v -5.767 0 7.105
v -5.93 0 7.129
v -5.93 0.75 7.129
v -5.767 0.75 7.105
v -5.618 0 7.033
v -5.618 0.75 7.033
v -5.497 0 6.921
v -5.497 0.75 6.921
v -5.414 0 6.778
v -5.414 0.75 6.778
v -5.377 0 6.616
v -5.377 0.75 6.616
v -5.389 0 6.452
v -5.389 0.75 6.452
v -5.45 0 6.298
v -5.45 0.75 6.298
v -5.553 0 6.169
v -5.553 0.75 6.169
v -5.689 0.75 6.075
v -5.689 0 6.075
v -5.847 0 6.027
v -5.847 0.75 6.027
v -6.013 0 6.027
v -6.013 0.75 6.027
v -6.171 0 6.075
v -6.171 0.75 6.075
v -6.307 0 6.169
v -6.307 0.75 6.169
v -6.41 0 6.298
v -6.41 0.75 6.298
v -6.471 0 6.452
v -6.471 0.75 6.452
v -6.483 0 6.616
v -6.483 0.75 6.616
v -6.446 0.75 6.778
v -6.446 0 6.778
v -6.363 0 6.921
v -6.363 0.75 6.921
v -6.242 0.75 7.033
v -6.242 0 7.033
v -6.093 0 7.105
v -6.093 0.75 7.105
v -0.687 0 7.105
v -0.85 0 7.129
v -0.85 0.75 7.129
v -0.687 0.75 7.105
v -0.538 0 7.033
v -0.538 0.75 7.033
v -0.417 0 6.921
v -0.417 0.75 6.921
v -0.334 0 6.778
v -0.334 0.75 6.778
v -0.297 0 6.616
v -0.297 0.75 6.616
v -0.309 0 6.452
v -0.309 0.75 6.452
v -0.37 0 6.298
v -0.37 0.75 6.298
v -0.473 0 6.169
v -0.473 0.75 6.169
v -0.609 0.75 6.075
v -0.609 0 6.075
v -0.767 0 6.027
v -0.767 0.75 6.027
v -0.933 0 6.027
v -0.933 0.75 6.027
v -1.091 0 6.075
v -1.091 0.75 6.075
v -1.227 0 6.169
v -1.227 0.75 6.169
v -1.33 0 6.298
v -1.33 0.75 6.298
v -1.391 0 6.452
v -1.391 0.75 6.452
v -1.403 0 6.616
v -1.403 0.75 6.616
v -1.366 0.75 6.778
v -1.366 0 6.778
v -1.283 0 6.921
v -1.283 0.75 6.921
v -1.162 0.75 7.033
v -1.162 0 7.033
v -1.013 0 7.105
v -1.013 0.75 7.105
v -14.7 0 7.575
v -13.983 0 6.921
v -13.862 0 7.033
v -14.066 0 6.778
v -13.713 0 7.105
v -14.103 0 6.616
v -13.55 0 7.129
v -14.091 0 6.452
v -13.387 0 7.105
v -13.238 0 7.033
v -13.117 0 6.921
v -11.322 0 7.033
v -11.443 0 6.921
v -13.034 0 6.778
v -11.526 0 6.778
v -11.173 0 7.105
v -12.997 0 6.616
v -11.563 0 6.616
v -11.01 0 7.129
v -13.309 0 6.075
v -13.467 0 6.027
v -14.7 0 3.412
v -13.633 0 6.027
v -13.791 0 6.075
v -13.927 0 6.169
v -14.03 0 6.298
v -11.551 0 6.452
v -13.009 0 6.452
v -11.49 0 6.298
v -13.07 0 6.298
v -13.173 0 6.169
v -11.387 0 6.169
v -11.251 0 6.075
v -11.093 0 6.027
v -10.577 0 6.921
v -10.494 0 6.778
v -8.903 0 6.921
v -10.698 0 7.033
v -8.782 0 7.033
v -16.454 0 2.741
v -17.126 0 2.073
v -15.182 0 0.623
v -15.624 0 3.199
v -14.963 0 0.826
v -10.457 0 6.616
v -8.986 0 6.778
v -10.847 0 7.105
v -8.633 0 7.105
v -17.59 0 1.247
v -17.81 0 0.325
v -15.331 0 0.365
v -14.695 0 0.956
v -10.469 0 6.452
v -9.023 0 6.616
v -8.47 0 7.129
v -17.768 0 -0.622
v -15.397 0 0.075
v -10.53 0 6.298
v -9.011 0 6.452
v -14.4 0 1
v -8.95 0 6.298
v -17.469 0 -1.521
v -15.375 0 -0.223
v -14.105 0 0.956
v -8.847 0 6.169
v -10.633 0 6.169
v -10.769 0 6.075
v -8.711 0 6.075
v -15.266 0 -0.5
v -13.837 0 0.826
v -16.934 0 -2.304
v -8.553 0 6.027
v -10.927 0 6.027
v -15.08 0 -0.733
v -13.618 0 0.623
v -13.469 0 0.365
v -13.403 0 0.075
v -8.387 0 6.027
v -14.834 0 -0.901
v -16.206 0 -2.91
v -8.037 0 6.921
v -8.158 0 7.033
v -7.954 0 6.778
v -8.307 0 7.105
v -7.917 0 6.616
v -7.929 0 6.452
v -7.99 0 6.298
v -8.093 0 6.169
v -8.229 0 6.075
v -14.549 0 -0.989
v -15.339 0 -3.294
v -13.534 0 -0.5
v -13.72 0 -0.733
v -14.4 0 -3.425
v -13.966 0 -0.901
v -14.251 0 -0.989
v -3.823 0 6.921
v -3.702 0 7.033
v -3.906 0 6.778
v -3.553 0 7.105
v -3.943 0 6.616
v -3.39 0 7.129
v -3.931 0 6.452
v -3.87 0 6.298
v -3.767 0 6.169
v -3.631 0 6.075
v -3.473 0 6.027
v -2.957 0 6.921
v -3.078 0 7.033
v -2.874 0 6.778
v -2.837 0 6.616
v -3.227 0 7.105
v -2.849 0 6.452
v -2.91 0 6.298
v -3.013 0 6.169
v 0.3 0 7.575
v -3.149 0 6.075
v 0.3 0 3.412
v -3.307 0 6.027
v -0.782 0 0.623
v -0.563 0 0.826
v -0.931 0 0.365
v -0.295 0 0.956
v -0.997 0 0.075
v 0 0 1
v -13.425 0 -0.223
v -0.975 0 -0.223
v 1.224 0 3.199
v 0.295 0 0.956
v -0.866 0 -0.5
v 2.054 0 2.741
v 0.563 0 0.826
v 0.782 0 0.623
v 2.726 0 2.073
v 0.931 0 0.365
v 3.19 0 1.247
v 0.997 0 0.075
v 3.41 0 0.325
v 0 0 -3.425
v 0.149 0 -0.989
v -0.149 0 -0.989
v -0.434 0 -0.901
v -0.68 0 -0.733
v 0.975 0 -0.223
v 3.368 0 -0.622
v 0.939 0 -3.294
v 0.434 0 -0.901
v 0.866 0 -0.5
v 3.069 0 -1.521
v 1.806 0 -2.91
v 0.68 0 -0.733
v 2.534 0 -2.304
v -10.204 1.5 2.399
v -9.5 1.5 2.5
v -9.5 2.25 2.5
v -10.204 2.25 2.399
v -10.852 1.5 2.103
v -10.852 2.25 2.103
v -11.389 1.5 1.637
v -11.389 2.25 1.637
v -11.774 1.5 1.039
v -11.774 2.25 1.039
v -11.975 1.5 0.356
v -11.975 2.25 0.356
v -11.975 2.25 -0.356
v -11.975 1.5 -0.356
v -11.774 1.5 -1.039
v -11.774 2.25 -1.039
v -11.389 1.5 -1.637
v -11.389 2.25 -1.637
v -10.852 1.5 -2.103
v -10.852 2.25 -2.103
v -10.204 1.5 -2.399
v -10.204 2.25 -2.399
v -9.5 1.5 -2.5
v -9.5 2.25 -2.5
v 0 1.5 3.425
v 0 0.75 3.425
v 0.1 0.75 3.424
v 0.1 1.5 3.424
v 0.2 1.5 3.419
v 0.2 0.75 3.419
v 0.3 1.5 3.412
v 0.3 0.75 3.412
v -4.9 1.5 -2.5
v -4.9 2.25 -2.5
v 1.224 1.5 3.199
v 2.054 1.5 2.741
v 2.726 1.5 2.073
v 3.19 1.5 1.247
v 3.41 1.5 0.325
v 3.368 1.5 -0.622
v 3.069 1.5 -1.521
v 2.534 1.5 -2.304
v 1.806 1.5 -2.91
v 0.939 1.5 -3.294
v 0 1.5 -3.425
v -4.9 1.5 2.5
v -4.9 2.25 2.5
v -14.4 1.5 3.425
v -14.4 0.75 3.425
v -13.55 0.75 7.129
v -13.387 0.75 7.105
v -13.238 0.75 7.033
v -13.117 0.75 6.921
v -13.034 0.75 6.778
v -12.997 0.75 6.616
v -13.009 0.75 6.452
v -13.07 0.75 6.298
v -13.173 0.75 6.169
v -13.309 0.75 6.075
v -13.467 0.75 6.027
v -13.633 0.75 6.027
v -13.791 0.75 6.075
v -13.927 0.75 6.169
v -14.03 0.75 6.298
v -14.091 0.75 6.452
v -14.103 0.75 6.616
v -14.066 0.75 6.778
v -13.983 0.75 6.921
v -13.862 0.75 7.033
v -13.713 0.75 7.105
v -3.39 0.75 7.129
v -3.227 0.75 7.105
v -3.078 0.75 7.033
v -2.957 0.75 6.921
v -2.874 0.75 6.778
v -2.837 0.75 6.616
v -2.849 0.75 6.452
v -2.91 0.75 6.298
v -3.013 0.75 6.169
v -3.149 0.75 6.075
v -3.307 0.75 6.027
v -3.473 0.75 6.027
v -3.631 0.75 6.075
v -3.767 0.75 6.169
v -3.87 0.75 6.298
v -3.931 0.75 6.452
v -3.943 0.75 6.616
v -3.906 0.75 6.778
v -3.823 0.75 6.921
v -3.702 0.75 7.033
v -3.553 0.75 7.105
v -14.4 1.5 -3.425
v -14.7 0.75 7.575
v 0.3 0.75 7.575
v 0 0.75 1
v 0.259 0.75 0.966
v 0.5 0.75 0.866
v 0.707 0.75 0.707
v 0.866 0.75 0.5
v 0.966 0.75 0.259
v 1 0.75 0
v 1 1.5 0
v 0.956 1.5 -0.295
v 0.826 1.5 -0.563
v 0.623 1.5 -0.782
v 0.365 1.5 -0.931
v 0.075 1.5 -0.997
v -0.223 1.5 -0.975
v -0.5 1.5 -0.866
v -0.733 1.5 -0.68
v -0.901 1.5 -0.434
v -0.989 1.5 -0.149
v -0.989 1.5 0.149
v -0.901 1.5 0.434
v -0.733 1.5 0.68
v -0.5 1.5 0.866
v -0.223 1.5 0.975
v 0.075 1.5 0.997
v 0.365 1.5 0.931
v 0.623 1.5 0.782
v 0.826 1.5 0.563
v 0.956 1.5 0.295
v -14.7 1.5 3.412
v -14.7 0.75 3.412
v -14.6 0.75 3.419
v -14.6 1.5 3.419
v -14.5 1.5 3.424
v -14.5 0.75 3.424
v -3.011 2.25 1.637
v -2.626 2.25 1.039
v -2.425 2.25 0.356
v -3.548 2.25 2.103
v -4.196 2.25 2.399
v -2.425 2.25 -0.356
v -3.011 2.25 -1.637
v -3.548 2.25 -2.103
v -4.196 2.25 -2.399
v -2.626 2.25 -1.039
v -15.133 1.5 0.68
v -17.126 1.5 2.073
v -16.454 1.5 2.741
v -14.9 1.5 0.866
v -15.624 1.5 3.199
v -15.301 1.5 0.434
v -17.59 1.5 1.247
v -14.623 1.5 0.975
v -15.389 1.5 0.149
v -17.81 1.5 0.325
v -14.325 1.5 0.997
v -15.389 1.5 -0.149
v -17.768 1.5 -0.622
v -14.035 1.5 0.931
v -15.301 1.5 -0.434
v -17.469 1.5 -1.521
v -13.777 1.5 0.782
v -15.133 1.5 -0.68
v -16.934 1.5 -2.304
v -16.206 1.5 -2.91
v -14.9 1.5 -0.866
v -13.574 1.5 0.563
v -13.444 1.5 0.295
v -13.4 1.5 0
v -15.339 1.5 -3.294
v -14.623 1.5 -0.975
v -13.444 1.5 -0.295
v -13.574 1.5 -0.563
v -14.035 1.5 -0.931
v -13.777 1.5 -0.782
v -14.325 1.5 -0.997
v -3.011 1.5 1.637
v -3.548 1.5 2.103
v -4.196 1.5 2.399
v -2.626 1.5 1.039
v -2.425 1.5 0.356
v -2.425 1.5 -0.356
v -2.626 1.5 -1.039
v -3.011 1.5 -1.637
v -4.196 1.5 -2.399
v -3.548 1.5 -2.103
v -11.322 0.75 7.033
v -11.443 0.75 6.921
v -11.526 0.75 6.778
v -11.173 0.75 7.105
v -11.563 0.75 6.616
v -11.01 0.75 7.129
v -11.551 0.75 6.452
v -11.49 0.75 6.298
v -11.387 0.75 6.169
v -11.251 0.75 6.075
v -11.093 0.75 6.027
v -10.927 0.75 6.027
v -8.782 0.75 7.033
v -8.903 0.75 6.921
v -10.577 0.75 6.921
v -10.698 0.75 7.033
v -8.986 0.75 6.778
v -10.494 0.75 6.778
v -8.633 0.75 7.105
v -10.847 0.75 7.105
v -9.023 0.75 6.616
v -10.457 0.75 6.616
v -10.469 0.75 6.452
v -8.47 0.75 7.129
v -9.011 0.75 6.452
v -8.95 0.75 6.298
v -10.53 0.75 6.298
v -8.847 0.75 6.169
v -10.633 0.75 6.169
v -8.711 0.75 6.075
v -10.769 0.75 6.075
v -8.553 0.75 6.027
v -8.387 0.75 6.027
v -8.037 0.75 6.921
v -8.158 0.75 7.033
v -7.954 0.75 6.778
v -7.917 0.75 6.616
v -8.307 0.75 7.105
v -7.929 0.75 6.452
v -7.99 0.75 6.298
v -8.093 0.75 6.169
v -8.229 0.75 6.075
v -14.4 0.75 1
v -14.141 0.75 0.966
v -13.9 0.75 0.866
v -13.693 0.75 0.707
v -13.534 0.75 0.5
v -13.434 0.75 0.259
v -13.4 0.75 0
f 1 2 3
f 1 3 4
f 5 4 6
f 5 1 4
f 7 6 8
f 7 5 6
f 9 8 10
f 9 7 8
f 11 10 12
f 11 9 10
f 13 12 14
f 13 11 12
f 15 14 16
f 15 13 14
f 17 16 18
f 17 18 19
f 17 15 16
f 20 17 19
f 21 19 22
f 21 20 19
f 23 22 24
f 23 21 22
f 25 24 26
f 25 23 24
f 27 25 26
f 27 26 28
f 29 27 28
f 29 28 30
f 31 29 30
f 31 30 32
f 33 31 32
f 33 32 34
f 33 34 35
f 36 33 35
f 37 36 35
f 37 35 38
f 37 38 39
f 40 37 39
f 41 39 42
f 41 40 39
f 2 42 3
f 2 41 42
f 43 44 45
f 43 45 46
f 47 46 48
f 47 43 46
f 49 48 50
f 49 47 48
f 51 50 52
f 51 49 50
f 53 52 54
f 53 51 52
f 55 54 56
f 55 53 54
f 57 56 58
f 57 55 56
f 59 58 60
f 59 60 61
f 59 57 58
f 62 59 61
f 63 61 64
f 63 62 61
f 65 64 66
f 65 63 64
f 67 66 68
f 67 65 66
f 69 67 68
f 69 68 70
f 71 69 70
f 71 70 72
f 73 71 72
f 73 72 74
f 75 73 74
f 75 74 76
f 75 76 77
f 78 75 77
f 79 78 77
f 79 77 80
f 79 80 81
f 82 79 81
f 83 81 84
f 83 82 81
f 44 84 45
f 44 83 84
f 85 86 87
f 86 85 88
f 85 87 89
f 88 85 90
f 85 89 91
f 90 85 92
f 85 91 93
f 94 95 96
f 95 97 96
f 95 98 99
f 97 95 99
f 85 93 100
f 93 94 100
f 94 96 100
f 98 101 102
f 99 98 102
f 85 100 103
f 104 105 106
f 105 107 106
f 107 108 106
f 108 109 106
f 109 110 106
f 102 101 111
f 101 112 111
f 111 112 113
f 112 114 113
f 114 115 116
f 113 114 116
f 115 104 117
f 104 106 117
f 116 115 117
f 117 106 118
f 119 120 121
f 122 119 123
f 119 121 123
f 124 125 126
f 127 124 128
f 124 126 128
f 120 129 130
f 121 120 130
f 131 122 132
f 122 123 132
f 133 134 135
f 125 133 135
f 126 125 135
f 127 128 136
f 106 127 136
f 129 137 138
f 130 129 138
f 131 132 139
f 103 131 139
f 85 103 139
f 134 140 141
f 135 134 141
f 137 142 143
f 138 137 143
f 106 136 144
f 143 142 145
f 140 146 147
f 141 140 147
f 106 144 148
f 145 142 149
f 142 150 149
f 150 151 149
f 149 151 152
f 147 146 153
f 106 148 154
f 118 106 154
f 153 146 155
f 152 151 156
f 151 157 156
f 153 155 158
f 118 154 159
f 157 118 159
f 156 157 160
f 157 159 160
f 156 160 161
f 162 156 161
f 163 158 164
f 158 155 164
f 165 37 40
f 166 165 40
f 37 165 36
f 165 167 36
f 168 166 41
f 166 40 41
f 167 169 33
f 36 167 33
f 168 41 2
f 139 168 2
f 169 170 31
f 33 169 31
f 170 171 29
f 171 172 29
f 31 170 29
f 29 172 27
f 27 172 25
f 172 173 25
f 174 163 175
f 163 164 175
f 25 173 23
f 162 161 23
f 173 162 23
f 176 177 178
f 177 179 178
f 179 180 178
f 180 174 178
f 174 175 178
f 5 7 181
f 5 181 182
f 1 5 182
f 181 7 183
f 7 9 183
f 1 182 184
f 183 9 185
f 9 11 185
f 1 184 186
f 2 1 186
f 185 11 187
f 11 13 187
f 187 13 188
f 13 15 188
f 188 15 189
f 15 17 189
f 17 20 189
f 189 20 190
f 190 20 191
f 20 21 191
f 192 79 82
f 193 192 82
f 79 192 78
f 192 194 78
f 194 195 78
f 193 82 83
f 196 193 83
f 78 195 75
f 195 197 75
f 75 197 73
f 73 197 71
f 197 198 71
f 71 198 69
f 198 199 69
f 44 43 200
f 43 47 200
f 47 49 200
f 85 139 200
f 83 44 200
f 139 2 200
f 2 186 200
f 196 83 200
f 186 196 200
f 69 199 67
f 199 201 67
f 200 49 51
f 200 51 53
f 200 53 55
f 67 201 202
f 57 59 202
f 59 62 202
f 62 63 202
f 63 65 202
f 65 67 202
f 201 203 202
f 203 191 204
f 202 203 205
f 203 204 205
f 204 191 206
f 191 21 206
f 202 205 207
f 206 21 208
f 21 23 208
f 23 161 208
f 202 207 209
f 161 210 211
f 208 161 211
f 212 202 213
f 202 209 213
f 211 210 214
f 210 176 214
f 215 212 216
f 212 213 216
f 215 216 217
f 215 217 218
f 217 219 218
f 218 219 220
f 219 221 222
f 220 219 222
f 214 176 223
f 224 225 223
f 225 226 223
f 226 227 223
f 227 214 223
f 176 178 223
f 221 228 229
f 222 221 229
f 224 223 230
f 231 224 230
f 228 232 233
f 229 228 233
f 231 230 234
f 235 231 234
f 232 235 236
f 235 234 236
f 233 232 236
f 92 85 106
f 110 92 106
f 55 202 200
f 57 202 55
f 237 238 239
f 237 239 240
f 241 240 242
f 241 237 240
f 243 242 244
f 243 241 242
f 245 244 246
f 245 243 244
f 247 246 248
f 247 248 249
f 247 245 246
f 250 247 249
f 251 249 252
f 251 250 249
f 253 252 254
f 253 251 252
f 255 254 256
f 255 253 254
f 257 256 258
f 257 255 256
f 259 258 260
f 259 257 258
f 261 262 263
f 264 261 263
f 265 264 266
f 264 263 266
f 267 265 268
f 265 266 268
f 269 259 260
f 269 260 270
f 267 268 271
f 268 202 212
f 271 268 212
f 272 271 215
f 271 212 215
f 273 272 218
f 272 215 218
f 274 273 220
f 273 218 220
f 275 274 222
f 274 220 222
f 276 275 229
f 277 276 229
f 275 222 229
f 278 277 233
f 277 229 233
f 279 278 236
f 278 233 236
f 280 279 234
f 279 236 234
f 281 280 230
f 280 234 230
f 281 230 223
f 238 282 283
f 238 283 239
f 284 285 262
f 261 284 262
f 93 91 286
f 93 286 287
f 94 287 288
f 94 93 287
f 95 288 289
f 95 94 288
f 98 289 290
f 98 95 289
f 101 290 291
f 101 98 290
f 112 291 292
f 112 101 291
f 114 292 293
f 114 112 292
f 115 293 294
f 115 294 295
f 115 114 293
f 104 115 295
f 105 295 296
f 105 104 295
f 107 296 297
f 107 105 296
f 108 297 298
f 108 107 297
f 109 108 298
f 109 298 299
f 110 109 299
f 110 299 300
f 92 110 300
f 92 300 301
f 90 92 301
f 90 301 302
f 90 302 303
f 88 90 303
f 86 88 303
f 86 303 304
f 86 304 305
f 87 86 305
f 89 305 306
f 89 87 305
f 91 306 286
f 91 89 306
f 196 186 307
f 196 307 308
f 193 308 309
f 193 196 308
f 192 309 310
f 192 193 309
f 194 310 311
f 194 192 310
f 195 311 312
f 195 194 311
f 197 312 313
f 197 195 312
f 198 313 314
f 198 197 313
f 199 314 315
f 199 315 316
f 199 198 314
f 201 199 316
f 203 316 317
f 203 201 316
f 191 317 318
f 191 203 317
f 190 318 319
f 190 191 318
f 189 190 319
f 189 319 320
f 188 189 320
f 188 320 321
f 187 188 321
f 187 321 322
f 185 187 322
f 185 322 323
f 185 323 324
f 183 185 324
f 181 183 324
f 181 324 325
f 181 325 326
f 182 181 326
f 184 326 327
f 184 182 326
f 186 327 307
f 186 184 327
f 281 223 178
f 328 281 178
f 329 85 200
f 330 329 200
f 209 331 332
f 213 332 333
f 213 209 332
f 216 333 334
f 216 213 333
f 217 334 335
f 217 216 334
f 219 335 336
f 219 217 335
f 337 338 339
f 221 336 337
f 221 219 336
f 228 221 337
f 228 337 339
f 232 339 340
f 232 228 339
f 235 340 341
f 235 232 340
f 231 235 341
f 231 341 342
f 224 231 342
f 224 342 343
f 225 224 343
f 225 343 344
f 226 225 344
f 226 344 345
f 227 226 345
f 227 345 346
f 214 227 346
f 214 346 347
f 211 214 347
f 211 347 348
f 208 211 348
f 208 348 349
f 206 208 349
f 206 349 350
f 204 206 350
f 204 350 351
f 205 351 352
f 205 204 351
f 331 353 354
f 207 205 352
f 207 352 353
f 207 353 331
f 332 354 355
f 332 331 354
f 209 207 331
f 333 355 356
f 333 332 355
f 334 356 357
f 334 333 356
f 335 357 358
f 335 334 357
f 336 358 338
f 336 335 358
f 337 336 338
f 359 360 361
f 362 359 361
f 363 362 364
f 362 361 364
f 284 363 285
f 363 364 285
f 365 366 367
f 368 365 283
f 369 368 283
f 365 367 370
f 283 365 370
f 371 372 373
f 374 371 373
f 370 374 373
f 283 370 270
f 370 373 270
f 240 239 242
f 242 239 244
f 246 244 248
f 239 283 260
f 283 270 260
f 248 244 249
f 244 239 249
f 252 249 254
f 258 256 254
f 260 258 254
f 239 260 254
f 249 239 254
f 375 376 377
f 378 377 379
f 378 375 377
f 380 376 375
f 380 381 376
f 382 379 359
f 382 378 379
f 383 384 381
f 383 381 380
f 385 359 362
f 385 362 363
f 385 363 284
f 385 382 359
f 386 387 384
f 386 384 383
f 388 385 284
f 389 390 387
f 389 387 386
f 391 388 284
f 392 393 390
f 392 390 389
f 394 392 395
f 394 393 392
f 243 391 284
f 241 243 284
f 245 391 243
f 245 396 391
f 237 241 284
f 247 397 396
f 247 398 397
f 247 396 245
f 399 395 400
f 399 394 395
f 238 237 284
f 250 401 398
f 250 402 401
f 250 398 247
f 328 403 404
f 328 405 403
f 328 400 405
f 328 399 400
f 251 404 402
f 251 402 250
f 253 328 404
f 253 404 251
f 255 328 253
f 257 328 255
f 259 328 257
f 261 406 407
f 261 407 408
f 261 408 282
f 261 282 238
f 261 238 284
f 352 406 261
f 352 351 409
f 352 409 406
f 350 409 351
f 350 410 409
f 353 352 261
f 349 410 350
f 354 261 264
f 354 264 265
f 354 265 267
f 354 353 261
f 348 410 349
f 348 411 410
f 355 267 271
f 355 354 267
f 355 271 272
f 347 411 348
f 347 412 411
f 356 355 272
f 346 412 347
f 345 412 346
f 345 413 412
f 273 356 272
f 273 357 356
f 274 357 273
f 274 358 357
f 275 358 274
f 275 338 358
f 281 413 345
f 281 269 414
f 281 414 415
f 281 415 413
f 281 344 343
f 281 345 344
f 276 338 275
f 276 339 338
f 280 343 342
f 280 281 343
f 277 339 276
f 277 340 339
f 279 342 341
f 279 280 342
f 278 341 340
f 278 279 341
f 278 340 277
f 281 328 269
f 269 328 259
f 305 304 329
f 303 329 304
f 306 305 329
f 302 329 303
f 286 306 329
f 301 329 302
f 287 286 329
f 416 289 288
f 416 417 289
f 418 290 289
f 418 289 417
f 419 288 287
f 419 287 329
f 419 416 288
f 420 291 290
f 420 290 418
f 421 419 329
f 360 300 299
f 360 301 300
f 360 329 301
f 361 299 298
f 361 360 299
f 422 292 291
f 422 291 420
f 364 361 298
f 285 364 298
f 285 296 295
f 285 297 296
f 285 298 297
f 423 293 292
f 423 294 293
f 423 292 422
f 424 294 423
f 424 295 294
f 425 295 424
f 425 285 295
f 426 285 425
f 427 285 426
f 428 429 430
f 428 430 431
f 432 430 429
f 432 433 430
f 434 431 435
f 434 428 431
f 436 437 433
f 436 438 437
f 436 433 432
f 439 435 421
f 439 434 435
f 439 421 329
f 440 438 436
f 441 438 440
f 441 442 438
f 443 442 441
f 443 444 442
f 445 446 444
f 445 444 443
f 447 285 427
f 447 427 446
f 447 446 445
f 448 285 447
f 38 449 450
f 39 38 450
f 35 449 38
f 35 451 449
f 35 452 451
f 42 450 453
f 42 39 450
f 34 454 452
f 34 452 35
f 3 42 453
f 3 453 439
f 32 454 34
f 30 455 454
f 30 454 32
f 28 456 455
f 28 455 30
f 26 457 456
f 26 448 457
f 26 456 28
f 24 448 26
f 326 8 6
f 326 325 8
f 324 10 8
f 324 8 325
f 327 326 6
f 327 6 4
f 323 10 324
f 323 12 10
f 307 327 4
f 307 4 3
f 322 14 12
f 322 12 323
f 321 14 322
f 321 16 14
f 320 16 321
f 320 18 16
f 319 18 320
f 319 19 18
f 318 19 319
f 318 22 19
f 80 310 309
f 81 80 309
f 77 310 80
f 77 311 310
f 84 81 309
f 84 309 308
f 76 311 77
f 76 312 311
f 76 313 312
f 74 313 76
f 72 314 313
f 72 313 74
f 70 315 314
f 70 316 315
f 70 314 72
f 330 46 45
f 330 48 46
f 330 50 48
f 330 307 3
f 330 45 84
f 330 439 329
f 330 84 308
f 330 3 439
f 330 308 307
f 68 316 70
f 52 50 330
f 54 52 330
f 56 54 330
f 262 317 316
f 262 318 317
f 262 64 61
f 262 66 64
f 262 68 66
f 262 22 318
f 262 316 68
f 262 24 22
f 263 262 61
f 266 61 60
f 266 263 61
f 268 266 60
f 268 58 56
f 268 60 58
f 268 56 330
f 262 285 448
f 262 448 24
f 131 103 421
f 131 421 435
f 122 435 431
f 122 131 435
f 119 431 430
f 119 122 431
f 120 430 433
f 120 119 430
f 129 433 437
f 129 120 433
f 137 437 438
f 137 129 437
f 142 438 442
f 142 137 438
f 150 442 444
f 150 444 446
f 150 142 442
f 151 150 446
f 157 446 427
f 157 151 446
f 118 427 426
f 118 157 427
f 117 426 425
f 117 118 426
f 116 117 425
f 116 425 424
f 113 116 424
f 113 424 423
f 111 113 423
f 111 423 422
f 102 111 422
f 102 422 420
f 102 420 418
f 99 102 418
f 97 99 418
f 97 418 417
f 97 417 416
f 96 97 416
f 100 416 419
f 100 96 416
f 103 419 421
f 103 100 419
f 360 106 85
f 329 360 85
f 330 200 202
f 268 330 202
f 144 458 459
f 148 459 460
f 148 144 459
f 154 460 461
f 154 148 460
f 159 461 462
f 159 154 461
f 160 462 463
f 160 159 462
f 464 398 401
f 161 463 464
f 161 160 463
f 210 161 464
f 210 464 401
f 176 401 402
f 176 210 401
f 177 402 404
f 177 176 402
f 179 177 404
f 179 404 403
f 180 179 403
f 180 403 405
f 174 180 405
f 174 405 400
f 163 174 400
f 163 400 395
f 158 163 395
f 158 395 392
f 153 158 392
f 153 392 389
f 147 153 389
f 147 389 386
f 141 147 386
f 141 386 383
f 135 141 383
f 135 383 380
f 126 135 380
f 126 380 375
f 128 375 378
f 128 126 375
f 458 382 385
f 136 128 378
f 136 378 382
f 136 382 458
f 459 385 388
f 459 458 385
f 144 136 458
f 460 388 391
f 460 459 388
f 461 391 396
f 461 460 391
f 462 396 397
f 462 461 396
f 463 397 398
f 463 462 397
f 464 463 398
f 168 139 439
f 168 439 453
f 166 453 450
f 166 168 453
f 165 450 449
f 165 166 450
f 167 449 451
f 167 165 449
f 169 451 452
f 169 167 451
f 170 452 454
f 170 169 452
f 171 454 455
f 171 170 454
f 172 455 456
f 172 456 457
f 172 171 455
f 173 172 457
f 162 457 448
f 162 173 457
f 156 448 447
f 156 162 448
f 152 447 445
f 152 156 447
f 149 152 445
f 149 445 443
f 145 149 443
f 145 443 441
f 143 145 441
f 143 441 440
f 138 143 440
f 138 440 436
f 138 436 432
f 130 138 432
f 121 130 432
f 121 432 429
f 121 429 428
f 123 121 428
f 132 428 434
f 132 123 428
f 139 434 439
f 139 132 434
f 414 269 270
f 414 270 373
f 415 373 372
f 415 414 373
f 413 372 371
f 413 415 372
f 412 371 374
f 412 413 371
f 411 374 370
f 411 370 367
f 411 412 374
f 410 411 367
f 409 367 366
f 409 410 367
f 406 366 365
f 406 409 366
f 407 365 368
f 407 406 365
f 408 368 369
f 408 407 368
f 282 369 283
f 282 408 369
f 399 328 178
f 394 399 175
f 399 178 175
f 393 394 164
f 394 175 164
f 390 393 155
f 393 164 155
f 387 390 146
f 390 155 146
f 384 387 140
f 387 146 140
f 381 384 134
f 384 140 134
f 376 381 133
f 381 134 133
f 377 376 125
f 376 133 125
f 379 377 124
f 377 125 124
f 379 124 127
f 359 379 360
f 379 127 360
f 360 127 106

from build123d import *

# Parameters (mm, degrees)
SKETCH_2_R      = 1
SKETCH_2_R_2    = 0.554445532
EXTRUDE_3_DEPTH = 0.75
SKETCH_2_5_R    = 1
EXTRUDE_4_DEPTH = 1.5
EXTRUDE_5_DEPTH = 0.75


with BuildPart() as part:
    # 草图2 → 凸台-拉伸3 (new body)
    with BuildSketch(Plane(origin=(0, 0, 0), x_dir=(1, 0, 0), z_dir=(0, 1, 0))):
        with BuildLine():
            Line((0, 3.425), (-14.4, 3.425))
            ThreePointArc((-14.4, 3.425), (-17.821707421, 0.150144339), (-14.7, -3.411836016))
            Line((-14.7, -3.411836016), (-14.7, -7.575))
            Line((-14.7, -7.575), (0.3, -7.575))
            Line((0.3, -7.575), (0.3, -3.411836016))
            ThreePointArc((0.3, -3.411836016), (3.421707421, 0.150144339), (0, 3.425))
        make_face()
        with Locations((-14.4, 0)):
            Circle(SKETCH_2_R, mode=Mode.SUBTRACT)
        Circle(SKETCH_2_R, mode=Mode.SUBTRACT)
        with Locations((-5.93, -6.575)):
            Circle(SKETCH_2_R_2, mode=Mode.SUBTRACT)
        with Locations((-3.39, -6.575)):
            Circle(SKETCH_2_R_2, mode=Mode.SUBTRACT)
        with Locations((-0.85, -6.575)):
            Circle(SKETCH_2_R_2, mode=Mode.SUBTRACT)
        with Locations((-13.55, -6.575)):
            Circle(SKETCH_2_R_2, mode=Mode.SUBTRACT)
        with Locations((-11.01, -6.575)):
            Circle(SKETCH_2_R_2, mode=Mode.SUBTRACT)
        with Locations((-8.47, -6.575)):
            Circle(SKETCH_2_R_2, mode=Mode.SUBTRACT)
    extrude(amount=EXTRUDE_3_DEPTH)

    # 草图2<5> → 凸台-拉伸4 (add)
    with BuildSketch(Plane(origin=(0, 0, 0), x_dir=(1, 0, 0), z_dir=(0, 1, 0))):
        with BuildLine():
            Line((0, 3.425), (-14.4, 3.425))
            ThreePointArc((-14.4, 3.425), (-17.821707421, 0.150144339), (-14.7, -3.411836016))
            ThreePointArc((-14.7, -3.411836016), (-14.550144339, -3.421707421), (-14.4, -3.425))
            Line((-14.4, -3.425), (0, -3.425))
            ThreePointArc((0, -3.425), (0.150144339, -3.421707421), (0.3, -3.411836016))
            ThreePointArc((0.3, -3.411836016), (3.421707421, 0.150144339), (0, 3.425))
        make_face()
        with Locations((-14.4, 0)):
            Circle(SKETCH_2_5_R, mode=Mode.SUBTRACT)
        Circle(SKETCH_2_5_R, mode=Mode.SUBTRACT)
    extrude(amount=EXTRUDE_4_DEPTH)

    # 草图3 → 凸台-拉伸5 (add)
    with BuildSketch(Plane(origin=(0, 1.5, 0), x_dir=(1, 0, 0), z_dir=(0, 1, 0))):
        with BuildLine():
            Line((-9.5, 2.5), (-4.9, 2.5))
            ThreePointArc((-4.9, 2.5), (-2.4, 0), (-4.9, -2.5))
            Line((-4.9, -2.5), (-9.5, -2.5))
            ThreePointArc((-9.5, -2.5), (-12, 0), (-9.5, 2.5))
        make_face()
    extrude(amount=EXTRUDE_5_DEPTH)


solid = part.part
